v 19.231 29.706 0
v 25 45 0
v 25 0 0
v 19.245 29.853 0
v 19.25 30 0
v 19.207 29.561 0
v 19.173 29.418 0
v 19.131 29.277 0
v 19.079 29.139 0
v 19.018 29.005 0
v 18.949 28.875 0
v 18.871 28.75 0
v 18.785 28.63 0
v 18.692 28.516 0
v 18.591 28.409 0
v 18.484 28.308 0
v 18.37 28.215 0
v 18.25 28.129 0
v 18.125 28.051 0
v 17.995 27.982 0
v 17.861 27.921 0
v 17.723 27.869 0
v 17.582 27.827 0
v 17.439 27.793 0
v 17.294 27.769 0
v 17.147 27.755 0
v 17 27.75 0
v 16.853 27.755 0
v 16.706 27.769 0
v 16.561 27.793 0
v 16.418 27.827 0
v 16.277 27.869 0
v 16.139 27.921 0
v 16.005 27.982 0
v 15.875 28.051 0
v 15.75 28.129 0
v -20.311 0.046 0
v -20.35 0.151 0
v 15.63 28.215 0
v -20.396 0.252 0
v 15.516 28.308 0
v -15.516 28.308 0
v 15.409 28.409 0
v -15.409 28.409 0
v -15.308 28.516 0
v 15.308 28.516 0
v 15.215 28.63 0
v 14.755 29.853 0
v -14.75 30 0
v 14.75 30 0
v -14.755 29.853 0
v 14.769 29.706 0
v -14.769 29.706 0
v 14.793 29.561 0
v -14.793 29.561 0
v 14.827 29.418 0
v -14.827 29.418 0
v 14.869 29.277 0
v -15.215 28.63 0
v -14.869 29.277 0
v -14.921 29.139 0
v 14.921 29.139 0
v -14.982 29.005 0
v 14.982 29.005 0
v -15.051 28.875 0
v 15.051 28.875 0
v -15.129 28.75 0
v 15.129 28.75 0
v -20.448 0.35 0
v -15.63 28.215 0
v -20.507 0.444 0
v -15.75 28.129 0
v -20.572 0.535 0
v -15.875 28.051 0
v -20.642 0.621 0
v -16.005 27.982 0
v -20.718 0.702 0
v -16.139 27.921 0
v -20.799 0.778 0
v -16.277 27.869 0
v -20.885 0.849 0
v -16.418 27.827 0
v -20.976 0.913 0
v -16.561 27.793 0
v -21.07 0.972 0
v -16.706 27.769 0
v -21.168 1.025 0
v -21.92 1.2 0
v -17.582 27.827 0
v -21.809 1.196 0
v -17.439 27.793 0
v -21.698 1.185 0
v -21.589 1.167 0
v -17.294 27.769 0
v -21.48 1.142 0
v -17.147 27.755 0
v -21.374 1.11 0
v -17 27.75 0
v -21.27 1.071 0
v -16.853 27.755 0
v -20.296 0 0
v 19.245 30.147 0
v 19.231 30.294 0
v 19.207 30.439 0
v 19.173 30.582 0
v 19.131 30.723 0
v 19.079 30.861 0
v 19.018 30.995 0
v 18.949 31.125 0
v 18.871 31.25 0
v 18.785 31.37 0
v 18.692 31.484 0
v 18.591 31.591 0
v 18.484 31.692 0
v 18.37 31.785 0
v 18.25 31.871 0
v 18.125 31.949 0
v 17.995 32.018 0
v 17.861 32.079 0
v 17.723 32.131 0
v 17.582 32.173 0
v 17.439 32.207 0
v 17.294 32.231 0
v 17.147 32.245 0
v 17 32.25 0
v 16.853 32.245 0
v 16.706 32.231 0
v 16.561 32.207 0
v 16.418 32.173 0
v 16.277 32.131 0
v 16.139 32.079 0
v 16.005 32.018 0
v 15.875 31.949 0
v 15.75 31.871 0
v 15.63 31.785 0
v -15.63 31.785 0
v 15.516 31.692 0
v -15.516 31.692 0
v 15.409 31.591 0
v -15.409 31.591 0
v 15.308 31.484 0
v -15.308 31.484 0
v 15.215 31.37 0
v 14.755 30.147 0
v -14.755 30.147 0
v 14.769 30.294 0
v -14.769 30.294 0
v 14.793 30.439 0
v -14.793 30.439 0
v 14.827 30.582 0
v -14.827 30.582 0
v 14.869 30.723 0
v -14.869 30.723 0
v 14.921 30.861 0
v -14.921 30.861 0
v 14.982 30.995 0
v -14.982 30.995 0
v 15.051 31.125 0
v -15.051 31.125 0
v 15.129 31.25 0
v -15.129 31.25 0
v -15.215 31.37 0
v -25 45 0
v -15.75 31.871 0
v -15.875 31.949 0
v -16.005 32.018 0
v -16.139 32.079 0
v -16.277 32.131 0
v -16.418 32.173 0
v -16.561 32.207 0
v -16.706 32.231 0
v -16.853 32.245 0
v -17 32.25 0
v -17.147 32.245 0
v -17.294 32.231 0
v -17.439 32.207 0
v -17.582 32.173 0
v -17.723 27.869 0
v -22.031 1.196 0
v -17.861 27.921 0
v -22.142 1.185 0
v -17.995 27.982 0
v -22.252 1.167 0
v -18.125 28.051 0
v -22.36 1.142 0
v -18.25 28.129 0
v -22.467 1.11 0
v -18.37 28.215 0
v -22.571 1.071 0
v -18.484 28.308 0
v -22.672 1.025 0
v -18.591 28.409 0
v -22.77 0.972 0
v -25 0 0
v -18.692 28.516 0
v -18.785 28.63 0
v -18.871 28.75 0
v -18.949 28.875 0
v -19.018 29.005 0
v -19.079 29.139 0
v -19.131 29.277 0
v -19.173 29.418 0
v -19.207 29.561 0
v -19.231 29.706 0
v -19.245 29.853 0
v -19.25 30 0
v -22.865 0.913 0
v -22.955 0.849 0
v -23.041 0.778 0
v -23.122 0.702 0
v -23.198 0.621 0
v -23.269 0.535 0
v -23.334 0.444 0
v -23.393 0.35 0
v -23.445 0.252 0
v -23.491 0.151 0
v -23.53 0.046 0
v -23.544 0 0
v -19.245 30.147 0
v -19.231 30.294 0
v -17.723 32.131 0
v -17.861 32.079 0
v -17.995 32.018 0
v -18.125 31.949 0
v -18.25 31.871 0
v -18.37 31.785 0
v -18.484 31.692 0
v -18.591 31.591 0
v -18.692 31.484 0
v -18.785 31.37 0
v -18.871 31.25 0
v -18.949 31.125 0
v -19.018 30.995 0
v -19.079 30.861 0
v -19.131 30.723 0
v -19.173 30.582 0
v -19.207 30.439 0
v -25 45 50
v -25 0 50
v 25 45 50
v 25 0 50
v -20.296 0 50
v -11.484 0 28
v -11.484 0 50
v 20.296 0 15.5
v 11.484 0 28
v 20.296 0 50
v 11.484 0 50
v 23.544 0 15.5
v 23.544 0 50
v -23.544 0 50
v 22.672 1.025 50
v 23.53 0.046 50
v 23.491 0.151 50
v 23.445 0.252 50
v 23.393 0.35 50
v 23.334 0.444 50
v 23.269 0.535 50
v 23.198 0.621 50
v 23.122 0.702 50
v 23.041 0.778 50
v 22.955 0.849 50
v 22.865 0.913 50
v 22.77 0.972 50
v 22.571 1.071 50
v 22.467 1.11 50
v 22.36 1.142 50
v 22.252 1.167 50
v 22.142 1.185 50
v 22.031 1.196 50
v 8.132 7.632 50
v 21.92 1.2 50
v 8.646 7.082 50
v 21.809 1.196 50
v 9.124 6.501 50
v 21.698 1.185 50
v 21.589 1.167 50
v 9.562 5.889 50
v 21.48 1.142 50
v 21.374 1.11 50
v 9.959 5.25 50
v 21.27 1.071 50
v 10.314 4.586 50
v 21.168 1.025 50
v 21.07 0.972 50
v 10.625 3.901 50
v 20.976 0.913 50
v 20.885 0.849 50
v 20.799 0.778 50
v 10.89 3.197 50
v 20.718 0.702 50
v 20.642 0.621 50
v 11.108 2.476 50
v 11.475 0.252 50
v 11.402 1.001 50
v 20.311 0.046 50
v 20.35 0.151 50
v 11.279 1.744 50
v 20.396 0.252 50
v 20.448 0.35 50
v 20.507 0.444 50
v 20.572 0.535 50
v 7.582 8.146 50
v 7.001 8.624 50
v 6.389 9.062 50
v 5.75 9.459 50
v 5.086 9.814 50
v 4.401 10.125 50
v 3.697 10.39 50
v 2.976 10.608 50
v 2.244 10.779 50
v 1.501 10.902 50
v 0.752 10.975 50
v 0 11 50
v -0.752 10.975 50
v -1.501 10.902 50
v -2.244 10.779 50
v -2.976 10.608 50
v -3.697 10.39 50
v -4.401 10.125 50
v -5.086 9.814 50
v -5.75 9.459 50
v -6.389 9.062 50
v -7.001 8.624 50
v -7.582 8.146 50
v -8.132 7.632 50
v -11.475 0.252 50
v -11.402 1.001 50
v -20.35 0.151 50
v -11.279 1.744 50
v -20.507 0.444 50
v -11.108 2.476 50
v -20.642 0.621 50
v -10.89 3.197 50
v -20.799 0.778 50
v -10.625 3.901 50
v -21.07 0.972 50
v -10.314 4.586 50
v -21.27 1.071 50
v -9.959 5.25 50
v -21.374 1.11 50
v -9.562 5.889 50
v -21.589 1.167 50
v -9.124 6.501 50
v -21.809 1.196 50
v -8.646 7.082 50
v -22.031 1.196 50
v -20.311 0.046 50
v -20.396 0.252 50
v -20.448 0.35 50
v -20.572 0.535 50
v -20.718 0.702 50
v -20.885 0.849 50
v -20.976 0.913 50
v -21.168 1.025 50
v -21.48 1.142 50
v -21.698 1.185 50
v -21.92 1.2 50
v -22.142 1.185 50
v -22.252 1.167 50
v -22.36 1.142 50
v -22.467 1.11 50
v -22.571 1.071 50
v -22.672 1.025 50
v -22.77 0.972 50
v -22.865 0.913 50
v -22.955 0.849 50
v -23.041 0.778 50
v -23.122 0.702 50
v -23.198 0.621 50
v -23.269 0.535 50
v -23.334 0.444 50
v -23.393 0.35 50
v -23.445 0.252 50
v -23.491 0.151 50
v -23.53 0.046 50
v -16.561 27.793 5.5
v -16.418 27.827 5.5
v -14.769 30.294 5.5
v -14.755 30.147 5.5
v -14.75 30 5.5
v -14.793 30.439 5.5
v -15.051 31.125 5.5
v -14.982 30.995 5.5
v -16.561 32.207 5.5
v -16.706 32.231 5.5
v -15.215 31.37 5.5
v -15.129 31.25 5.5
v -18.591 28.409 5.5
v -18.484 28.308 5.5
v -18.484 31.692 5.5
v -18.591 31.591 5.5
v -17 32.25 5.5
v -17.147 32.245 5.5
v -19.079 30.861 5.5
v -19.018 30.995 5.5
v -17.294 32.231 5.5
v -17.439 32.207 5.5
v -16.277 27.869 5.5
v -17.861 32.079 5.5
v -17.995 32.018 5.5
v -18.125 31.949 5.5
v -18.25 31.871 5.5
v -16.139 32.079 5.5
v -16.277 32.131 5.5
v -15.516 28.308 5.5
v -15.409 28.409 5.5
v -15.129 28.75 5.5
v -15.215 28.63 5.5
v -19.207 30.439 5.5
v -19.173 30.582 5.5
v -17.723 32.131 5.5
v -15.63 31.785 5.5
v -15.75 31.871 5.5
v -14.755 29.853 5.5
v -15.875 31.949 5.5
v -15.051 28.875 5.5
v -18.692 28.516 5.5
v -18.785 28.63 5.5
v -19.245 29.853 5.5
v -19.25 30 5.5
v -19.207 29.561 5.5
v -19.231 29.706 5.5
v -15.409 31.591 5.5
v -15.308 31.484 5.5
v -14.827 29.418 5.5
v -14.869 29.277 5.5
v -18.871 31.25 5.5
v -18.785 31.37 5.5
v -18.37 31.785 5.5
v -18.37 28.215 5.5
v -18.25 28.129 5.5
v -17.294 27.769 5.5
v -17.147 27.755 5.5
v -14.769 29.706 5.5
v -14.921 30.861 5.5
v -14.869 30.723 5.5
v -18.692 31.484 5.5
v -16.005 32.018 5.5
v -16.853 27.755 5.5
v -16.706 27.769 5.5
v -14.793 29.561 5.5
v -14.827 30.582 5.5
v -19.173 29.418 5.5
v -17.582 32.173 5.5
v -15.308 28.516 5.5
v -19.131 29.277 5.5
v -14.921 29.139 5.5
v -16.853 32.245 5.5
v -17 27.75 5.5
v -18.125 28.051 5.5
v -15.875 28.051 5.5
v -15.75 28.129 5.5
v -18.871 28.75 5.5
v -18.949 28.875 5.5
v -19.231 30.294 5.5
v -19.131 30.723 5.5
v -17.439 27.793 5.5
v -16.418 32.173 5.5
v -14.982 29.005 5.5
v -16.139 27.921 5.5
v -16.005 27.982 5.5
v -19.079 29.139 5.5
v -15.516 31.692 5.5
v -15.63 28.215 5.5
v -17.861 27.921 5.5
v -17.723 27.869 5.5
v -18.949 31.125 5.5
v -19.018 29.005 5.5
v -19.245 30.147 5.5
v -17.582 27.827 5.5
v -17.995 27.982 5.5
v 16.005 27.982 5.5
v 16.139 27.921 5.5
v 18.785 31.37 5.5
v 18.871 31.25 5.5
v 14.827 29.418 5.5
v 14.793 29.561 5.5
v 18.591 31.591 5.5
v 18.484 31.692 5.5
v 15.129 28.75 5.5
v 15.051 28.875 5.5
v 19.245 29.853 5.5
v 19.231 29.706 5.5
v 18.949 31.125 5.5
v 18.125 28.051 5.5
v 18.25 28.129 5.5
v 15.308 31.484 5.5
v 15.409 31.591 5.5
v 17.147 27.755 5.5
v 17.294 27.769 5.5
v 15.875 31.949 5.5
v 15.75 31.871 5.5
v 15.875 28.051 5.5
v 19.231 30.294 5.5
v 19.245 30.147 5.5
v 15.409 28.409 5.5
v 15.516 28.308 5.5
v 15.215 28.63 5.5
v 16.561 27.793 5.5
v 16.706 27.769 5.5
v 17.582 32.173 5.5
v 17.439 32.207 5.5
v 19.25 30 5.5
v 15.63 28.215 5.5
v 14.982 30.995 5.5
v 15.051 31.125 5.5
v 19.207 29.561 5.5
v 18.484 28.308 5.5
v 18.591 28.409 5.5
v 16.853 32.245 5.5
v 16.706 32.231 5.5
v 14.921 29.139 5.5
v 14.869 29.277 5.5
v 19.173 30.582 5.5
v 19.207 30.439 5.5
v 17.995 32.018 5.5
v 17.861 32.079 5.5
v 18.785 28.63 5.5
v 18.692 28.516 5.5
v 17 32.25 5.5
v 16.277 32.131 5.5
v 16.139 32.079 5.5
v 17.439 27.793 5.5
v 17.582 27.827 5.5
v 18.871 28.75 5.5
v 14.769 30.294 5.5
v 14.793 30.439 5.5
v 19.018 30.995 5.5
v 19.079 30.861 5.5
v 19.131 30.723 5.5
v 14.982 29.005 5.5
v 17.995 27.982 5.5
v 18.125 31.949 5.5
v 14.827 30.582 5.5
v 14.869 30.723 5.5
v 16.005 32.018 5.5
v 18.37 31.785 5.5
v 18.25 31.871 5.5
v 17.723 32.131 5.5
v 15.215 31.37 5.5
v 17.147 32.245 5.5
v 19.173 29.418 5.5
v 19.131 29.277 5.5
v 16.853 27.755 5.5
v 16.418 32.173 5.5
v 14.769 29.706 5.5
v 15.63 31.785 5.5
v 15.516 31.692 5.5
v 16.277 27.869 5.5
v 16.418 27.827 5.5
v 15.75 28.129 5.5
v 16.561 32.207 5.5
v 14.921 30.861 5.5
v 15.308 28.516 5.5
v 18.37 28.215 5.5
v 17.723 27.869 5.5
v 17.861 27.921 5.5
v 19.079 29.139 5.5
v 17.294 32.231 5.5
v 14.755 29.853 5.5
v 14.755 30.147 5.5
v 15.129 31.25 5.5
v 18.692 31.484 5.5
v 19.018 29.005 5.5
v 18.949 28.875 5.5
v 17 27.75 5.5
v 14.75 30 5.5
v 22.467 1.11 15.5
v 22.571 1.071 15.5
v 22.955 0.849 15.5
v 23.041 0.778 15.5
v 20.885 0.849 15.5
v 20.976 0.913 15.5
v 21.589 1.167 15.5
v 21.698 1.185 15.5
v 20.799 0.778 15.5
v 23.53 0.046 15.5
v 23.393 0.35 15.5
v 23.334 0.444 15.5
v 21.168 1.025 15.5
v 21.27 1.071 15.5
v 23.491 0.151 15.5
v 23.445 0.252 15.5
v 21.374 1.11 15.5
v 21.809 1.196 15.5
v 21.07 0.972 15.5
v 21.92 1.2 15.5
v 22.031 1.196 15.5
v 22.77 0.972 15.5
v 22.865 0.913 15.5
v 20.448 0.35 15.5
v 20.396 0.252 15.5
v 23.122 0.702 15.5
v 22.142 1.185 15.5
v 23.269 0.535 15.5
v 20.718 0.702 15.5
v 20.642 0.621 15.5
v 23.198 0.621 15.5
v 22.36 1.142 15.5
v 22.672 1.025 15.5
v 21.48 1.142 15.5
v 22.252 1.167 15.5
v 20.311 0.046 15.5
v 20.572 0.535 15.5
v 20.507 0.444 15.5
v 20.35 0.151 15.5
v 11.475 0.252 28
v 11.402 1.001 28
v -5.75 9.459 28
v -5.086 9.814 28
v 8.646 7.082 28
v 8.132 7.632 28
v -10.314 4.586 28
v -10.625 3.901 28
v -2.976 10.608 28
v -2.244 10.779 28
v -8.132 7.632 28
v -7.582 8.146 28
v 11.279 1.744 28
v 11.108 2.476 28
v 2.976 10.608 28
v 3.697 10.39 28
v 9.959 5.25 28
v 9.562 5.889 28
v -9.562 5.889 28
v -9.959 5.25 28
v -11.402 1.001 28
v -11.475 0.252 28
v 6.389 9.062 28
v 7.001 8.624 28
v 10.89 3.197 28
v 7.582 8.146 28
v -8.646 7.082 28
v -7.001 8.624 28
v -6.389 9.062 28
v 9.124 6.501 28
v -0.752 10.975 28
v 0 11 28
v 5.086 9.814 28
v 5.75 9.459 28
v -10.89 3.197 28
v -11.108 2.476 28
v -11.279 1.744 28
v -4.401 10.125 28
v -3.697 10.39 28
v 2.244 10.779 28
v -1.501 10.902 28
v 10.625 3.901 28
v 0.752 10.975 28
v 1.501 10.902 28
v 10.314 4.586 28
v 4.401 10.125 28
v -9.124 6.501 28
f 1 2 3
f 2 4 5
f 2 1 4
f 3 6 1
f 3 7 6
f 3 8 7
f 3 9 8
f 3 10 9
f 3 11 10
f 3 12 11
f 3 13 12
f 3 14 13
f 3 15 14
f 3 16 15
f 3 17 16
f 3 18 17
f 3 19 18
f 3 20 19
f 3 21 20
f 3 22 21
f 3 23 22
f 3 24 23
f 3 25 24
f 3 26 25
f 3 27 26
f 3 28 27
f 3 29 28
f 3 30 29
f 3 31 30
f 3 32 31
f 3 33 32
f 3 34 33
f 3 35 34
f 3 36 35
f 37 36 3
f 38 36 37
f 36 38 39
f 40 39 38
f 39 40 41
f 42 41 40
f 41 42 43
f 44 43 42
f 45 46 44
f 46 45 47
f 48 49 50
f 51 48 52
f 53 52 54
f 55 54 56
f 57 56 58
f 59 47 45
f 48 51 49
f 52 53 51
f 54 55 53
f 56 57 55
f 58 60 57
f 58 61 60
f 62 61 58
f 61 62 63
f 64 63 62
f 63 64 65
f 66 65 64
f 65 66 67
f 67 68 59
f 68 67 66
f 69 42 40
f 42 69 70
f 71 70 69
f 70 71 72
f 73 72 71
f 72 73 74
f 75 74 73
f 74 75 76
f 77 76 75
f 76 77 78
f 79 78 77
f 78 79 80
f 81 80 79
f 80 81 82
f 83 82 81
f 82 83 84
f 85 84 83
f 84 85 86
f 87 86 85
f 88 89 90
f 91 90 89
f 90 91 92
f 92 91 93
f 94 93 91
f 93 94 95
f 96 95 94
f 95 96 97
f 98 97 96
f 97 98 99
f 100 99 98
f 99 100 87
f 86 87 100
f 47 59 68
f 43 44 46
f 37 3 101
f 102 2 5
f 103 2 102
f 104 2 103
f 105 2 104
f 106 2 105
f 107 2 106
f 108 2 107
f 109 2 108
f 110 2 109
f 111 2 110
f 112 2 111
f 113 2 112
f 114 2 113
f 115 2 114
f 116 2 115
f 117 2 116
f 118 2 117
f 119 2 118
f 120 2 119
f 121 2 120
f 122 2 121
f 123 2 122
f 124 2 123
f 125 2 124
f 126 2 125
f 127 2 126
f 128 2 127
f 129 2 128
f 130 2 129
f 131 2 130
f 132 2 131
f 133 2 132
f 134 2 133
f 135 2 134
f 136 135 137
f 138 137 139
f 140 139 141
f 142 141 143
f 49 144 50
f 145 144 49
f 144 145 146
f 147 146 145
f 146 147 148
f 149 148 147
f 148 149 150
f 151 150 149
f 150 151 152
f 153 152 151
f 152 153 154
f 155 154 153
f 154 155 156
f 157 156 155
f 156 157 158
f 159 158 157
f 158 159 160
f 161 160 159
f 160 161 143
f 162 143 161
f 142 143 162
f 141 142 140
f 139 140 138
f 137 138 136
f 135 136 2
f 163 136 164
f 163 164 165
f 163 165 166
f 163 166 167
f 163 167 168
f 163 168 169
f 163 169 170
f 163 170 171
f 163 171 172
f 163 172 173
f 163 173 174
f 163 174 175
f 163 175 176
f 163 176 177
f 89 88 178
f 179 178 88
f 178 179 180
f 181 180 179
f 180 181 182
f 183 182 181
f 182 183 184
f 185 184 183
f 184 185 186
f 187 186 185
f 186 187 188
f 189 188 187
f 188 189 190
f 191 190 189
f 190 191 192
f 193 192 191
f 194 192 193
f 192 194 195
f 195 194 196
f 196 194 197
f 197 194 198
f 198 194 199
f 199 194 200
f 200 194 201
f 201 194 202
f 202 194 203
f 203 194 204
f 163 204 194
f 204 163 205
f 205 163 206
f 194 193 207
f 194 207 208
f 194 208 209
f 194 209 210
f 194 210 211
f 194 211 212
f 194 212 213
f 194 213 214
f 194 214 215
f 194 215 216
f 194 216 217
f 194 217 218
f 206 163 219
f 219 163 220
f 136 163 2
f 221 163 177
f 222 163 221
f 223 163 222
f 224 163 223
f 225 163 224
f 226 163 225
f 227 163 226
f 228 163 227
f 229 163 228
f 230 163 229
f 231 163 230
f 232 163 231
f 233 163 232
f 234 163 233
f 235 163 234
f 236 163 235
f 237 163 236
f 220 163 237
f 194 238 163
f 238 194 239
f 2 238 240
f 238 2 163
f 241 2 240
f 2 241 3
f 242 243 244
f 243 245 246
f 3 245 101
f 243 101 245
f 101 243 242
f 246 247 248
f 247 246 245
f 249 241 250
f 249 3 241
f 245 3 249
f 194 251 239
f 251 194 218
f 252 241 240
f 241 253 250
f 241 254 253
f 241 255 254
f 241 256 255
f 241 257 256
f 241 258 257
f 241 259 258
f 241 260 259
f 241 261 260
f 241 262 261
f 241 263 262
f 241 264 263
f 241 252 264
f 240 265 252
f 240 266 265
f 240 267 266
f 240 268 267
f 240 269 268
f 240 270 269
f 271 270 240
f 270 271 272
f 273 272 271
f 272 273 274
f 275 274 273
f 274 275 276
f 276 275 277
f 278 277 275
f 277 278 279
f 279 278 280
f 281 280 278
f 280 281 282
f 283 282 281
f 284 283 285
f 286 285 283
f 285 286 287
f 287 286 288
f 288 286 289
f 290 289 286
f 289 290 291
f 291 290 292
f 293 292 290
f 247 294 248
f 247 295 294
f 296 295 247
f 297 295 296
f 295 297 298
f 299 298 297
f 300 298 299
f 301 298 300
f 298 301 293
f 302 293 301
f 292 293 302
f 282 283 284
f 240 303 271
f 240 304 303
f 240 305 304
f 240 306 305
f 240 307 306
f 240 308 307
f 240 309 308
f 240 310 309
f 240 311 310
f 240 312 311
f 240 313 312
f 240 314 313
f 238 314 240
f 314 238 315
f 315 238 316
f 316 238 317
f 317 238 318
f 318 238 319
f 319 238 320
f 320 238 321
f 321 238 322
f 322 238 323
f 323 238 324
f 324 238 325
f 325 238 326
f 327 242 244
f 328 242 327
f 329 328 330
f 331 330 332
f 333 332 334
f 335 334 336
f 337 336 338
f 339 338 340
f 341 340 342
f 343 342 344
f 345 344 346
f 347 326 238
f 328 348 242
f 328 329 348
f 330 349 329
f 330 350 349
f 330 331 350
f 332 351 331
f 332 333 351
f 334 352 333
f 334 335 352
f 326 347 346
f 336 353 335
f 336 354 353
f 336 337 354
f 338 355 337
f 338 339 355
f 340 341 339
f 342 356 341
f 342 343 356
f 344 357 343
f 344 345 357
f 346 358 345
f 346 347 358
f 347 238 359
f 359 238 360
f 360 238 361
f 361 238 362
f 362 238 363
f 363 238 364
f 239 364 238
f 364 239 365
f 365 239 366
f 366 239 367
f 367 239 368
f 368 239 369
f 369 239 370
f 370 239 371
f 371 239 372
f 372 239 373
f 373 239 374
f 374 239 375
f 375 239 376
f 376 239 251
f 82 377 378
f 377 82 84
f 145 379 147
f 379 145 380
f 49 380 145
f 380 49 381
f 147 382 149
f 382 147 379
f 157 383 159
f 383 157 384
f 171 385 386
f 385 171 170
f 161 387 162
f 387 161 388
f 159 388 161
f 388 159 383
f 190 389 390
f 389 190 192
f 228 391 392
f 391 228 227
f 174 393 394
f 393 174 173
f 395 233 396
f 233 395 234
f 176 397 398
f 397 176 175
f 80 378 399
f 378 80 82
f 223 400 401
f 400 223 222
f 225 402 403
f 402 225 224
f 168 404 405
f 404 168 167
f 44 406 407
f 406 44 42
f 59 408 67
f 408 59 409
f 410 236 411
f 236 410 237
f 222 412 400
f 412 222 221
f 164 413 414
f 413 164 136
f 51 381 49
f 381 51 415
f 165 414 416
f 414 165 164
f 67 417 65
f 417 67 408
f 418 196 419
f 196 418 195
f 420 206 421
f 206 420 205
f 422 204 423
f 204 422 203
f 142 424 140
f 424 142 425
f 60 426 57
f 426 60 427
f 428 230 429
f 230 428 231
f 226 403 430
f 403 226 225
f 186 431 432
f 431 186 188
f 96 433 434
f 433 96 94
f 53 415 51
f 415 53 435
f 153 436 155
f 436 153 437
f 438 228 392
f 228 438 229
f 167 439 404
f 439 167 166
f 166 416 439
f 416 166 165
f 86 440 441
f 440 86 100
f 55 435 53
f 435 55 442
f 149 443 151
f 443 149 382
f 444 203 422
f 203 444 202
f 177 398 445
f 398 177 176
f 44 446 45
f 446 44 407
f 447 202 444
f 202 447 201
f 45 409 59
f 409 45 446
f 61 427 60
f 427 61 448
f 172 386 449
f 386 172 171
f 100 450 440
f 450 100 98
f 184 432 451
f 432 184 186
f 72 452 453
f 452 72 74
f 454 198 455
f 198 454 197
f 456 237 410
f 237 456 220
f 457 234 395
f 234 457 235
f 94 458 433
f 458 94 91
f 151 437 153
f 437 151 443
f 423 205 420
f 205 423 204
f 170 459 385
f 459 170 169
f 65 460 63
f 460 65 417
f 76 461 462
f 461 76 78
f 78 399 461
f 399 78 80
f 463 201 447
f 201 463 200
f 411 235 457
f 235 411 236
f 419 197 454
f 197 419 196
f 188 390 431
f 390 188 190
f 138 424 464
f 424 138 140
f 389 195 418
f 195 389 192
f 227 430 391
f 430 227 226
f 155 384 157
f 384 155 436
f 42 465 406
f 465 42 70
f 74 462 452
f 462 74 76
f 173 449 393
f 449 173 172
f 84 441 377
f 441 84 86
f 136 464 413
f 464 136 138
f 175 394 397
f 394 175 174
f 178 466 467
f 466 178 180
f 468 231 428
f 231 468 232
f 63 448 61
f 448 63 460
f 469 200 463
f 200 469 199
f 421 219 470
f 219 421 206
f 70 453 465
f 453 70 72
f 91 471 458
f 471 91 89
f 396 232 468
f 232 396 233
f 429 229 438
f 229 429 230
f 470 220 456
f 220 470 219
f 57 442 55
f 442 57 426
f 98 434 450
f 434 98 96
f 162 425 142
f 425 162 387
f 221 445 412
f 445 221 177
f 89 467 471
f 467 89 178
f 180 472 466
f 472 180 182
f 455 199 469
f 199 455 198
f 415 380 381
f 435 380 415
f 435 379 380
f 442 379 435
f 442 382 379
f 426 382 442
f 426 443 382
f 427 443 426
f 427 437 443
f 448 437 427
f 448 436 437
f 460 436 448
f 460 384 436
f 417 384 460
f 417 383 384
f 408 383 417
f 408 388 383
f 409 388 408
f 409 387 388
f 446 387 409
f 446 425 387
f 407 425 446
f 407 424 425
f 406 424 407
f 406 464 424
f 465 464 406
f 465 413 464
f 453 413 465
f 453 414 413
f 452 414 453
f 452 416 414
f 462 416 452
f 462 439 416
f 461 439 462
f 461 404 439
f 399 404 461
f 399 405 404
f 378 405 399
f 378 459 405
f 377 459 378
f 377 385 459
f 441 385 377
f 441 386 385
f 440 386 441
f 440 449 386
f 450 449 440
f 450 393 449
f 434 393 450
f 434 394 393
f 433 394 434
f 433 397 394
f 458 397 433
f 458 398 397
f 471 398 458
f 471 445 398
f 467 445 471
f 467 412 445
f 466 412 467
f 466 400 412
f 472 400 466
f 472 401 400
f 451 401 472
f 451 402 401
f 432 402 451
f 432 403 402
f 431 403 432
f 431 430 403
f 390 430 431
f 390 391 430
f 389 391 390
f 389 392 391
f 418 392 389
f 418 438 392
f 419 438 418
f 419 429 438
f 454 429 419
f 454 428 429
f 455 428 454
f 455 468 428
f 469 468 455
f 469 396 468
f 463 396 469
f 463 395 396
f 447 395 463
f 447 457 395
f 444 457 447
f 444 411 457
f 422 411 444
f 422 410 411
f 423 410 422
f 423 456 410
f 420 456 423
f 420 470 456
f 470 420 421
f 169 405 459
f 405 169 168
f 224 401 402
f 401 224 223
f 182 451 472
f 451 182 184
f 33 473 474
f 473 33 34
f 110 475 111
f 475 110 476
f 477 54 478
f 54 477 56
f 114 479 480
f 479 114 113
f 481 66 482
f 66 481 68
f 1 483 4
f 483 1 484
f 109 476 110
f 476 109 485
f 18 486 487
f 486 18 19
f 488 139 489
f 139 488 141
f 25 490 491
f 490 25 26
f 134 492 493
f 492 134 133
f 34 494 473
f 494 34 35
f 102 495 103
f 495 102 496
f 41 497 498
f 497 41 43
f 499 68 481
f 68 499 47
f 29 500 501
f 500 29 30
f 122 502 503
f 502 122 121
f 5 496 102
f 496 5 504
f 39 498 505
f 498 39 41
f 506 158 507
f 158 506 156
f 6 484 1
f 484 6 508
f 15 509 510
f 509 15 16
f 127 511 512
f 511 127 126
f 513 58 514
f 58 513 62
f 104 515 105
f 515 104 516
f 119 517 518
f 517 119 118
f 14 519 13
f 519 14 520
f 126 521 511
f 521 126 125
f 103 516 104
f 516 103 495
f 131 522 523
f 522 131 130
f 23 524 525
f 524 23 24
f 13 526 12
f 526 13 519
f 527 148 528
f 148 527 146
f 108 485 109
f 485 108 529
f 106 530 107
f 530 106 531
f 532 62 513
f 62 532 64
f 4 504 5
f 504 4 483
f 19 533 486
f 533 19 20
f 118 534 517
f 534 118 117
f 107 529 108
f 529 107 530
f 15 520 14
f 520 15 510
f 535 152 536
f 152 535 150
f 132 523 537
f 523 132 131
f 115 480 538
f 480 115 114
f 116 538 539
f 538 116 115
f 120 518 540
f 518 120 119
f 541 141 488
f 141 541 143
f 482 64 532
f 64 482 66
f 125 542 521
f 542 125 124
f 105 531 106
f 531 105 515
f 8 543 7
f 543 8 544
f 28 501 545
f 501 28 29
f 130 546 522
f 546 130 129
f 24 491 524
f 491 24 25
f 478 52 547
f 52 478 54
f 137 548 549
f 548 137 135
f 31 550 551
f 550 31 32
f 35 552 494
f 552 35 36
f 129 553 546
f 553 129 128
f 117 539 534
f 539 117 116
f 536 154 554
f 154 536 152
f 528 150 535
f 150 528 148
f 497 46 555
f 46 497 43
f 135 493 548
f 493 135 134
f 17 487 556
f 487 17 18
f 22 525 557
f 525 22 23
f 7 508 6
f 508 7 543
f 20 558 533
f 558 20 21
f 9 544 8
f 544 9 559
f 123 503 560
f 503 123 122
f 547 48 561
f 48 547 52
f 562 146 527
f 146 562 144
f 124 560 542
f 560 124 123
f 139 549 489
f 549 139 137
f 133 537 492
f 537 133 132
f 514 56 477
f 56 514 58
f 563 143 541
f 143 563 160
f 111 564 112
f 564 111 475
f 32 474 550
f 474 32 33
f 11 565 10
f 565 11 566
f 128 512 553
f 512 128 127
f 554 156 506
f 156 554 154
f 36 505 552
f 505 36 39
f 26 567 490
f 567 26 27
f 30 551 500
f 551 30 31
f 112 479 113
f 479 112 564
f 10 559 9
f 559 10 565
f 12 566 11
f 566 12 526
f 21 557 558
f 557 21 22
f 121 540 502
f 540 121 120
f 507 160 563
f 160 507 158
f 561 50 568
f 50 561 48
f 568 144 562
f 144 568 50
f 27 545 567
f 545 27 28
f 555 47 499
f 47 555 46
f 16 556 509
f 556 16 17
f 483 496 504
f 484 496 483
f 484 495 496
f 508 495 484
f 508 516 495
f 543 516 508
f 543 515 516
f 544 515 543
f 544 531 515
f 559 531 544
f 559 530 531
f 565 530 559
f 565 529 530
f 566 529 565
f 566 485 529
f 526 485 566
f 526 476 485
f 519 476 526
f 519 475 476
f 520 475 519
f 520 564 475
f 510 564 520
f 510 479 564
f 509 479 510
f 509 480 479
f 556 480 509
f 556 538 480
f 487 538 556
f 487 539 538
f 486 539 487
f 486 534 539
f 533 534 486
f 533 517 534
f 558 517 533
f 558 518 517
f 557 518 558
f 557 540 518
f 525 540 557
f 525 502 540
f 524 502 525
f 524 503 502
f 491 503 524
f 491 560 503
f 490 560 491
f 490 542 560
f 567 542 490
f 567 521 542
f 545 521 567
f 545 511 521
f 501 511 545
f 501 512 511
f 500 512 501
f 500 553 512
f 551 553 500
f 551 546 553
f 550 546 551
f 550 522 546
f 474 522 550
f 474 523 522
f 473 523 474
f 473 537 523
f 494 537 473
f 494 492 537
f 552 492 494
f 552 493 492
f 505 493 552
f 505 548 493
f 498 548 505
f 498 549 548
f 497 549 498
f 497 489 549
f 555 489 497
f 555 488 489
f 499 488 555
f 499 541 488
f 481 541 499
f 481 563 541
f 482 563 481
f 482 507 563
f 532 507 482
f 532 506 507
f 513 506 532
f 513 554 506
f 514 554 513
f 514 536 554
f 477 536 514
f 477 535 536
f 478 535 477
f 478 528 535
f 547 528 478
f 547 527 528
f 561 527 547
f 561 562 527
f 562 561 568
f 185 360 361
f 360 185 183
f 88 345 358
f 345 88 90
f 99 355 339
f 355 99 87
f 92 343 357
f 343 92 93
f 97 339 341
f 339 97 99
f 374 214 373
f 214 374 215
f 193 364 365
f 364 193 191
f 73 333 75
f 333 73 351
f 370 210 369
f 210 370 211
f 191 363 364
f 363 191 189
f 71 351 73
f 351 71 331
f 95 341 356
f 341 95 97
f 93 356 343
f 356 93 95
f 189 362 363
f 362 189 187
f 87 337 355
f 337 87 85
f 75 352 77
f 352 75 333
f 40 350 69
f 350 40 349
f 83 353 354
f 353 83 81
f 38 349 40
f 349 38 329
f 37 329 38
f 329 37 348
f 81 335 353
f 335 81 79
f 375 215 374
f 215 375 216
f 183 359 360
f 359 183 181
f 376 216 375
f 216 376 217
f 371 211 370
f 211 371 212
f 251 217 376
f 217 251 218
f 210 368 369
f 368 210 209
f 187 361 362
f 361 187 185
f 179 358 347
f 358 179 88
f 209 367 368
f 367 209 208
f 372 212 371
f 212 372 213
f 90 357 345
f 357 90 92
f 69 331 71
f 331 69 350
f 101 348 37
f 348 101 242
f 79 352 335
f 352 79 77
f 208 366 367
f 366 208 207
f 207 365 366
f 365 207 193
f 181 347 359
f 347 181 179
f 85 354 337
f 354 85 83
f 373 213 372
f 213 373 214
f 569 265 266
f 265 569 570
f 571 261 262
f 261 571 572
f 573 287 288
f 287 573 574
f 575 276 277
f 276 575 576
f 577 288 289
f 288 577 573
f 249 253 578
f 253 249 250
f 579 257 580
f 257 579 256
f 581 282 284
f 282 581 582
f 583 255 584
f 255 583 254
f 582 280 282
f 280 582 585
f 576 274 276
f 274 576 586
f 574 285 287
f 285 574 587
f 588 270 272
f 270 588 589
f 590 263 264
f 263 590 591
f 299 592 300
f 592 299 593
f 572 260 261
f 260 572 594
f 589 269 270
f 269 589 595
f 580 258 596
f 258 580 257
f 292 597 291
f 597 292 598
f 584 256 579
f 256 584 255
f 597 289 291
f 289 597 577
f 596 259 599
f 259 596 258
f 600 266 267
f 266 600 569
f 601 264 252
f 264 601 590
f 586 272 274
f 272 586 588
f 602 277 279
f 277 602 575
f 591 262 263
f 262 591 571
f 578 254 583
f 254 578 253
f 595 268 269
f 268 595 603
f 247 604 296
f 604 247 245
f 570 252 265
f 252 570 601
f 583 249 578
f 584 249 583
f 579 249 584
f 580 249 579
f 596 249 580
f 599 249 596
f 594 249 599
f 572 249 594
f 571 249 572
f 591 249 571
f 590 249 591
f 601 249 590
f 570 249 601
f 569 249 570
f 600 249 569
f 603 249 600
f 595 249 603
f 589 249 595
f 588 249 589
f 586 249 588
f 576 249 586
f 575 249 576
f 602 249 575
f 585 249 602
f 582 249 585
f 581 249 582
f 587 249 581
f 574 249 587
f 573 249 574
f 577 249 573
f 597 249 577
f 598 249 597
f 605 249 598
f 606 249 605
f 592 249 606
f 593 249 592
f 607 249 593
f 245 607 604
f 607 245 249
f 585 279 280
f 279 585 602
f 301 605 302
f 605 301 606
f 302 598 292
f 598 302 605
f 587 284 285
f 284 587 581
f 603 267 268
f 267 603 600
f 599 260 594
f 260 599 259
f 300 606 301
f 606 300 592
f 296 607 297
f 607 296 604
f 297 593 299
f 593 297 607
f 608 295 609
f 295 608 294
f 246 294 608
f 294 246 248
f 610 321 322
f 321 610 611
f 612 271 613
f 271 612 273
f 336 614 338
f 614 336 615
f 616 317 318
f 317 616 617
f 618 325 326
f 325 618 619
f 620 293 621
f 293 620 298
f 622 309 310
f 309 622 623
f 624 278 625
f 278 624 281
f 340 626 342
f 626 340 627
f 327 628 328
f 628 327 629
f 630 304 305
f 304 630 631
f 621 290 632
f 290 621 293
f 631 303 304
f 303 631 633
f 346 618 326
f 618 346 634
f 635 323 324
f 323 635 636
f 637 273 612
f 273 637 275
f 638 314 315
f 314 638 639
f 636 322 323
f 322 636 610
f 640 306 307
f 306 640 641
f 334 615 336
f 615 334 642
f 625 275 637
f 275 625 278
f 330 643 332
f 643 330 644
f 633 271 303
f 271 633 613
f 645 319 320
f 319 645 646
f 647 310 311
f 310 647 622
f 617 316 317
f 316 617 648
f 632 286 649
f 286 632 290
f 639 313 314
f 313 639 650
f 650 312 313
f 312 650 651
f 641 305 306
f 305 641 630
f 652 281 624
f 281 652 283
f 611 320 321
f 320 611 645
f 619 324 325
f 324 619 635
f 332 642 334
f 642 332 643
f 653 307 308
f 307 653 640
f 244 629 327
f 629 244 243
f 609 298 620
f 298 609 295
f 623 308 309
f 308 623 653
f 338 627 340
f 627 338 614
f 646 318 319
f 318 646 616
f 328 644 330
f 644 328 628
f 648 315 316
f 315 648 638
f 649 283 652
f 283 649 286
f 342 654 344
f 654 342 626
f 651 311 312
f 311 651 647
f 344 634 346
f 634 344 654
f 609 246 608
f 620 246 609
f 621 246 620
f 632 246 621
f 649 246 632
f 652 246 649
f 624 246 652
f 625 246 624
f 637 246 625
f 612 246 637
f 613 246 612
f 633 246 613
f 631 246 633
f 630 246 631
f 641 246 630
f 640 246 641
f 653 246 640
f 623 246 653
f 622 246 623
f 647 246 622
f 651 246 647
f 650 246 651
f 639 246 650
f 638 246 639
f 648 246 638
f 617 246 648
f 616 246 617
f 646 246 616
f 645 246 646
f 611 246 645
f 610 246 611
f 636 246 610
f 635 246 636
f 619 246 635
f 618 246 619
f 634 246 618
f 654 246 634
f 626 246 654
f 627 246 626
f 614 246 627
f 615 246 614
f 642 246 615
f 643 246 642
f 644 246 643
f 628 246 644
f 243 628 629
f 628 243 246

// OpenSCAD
// NEMA 17 stepper motor L-shaped mounting bracket
// Print orientation: base plate on the bed, motor plate standing up

// ---------------- Parameters ----------------
plate_t       = 5;     // base plate thickness (Z)
motor_plate_h = 50;    // vertical motor plate height (Z)
base_x        = 25;    // base plate extends from -x to +x
base_y        = 45;    // base plate extends from y = 0 to y = base_y

hole_m4_x     = 17;    // M4 hole offset from centre in X (both + and -)
hole_m4_y     = 30;    // M4 hole Y position
hole_m4_d     = 4.5;   // M4 hole diameter

hole_motor_d  = 23;    // motor centring boss hole diameter
hole_motor_x  = 0;     // motor hole centre X
hole_motor_z  = 28;    // motor hole centre Z

hole_m3_d     = 3.4;   // M3 screw hole diameter
hole_m3_pitch = 31;    // M3 screw hole square pattern size
hole_m3_n     = 4;     // number of M3 holes

gusset_t      = 5;     // gusset thickness (X)
gusset_leg    = 20;    // gusset right triangle leg length (Y and Z)

eps           = 0.5;   // cutter overshoot past faces
$fn           = 96;    // curve resolution

// ---------------- Model ----------------
difference() {
    union() {
        // Base plate
        translate([-base_x, 0, 0])
            cube([base_x * 2, base_y, plate_t]);

        // Vertical motor plate
        translate([-base_x, 0, 0])
            cube([base_x * 2, base_y, motor_plate_h]);

        // Gussets, flush with left and right edges
        for (sx = [-1, 1])
            translate([sx > 0 ? base_x - gusset_t : -base_x, 0, 0])
                translate([0, base_y - gusset_leg, 0])
                    cube([gusset_t, gusset_leg, gusset_leg]);
    }

    // Through-holes in base plate (M4)
    for (x = [-hole_m4_x, hole_m4_x])
        translate([x, hole_m4_y, -eps])
            cylinder(d = hole_m4_d, h = plate_t + 2 * eps);

    // Motor centring boss hole (along Y)
    translate([hole_motor_x, -eps, hole_motor_z])
        cylinder(d = hole_motor_d, h = base_y + 2 * eps);

    // M3 screw holes on square pattern, centred on boss hole
    for (i = [0 : hole_m3_n - 1]) {
        a = hole_m3_pitch / sqrt(2);
        x = (i % 2 == 0) ? -a : a;
        z = (i / 2) * hole_m3_pitch;
        translate([x, -eps, z])
            cylinder(d = hole_m3_d, h = motor_plate_h + 2 * eps);
    }
}
